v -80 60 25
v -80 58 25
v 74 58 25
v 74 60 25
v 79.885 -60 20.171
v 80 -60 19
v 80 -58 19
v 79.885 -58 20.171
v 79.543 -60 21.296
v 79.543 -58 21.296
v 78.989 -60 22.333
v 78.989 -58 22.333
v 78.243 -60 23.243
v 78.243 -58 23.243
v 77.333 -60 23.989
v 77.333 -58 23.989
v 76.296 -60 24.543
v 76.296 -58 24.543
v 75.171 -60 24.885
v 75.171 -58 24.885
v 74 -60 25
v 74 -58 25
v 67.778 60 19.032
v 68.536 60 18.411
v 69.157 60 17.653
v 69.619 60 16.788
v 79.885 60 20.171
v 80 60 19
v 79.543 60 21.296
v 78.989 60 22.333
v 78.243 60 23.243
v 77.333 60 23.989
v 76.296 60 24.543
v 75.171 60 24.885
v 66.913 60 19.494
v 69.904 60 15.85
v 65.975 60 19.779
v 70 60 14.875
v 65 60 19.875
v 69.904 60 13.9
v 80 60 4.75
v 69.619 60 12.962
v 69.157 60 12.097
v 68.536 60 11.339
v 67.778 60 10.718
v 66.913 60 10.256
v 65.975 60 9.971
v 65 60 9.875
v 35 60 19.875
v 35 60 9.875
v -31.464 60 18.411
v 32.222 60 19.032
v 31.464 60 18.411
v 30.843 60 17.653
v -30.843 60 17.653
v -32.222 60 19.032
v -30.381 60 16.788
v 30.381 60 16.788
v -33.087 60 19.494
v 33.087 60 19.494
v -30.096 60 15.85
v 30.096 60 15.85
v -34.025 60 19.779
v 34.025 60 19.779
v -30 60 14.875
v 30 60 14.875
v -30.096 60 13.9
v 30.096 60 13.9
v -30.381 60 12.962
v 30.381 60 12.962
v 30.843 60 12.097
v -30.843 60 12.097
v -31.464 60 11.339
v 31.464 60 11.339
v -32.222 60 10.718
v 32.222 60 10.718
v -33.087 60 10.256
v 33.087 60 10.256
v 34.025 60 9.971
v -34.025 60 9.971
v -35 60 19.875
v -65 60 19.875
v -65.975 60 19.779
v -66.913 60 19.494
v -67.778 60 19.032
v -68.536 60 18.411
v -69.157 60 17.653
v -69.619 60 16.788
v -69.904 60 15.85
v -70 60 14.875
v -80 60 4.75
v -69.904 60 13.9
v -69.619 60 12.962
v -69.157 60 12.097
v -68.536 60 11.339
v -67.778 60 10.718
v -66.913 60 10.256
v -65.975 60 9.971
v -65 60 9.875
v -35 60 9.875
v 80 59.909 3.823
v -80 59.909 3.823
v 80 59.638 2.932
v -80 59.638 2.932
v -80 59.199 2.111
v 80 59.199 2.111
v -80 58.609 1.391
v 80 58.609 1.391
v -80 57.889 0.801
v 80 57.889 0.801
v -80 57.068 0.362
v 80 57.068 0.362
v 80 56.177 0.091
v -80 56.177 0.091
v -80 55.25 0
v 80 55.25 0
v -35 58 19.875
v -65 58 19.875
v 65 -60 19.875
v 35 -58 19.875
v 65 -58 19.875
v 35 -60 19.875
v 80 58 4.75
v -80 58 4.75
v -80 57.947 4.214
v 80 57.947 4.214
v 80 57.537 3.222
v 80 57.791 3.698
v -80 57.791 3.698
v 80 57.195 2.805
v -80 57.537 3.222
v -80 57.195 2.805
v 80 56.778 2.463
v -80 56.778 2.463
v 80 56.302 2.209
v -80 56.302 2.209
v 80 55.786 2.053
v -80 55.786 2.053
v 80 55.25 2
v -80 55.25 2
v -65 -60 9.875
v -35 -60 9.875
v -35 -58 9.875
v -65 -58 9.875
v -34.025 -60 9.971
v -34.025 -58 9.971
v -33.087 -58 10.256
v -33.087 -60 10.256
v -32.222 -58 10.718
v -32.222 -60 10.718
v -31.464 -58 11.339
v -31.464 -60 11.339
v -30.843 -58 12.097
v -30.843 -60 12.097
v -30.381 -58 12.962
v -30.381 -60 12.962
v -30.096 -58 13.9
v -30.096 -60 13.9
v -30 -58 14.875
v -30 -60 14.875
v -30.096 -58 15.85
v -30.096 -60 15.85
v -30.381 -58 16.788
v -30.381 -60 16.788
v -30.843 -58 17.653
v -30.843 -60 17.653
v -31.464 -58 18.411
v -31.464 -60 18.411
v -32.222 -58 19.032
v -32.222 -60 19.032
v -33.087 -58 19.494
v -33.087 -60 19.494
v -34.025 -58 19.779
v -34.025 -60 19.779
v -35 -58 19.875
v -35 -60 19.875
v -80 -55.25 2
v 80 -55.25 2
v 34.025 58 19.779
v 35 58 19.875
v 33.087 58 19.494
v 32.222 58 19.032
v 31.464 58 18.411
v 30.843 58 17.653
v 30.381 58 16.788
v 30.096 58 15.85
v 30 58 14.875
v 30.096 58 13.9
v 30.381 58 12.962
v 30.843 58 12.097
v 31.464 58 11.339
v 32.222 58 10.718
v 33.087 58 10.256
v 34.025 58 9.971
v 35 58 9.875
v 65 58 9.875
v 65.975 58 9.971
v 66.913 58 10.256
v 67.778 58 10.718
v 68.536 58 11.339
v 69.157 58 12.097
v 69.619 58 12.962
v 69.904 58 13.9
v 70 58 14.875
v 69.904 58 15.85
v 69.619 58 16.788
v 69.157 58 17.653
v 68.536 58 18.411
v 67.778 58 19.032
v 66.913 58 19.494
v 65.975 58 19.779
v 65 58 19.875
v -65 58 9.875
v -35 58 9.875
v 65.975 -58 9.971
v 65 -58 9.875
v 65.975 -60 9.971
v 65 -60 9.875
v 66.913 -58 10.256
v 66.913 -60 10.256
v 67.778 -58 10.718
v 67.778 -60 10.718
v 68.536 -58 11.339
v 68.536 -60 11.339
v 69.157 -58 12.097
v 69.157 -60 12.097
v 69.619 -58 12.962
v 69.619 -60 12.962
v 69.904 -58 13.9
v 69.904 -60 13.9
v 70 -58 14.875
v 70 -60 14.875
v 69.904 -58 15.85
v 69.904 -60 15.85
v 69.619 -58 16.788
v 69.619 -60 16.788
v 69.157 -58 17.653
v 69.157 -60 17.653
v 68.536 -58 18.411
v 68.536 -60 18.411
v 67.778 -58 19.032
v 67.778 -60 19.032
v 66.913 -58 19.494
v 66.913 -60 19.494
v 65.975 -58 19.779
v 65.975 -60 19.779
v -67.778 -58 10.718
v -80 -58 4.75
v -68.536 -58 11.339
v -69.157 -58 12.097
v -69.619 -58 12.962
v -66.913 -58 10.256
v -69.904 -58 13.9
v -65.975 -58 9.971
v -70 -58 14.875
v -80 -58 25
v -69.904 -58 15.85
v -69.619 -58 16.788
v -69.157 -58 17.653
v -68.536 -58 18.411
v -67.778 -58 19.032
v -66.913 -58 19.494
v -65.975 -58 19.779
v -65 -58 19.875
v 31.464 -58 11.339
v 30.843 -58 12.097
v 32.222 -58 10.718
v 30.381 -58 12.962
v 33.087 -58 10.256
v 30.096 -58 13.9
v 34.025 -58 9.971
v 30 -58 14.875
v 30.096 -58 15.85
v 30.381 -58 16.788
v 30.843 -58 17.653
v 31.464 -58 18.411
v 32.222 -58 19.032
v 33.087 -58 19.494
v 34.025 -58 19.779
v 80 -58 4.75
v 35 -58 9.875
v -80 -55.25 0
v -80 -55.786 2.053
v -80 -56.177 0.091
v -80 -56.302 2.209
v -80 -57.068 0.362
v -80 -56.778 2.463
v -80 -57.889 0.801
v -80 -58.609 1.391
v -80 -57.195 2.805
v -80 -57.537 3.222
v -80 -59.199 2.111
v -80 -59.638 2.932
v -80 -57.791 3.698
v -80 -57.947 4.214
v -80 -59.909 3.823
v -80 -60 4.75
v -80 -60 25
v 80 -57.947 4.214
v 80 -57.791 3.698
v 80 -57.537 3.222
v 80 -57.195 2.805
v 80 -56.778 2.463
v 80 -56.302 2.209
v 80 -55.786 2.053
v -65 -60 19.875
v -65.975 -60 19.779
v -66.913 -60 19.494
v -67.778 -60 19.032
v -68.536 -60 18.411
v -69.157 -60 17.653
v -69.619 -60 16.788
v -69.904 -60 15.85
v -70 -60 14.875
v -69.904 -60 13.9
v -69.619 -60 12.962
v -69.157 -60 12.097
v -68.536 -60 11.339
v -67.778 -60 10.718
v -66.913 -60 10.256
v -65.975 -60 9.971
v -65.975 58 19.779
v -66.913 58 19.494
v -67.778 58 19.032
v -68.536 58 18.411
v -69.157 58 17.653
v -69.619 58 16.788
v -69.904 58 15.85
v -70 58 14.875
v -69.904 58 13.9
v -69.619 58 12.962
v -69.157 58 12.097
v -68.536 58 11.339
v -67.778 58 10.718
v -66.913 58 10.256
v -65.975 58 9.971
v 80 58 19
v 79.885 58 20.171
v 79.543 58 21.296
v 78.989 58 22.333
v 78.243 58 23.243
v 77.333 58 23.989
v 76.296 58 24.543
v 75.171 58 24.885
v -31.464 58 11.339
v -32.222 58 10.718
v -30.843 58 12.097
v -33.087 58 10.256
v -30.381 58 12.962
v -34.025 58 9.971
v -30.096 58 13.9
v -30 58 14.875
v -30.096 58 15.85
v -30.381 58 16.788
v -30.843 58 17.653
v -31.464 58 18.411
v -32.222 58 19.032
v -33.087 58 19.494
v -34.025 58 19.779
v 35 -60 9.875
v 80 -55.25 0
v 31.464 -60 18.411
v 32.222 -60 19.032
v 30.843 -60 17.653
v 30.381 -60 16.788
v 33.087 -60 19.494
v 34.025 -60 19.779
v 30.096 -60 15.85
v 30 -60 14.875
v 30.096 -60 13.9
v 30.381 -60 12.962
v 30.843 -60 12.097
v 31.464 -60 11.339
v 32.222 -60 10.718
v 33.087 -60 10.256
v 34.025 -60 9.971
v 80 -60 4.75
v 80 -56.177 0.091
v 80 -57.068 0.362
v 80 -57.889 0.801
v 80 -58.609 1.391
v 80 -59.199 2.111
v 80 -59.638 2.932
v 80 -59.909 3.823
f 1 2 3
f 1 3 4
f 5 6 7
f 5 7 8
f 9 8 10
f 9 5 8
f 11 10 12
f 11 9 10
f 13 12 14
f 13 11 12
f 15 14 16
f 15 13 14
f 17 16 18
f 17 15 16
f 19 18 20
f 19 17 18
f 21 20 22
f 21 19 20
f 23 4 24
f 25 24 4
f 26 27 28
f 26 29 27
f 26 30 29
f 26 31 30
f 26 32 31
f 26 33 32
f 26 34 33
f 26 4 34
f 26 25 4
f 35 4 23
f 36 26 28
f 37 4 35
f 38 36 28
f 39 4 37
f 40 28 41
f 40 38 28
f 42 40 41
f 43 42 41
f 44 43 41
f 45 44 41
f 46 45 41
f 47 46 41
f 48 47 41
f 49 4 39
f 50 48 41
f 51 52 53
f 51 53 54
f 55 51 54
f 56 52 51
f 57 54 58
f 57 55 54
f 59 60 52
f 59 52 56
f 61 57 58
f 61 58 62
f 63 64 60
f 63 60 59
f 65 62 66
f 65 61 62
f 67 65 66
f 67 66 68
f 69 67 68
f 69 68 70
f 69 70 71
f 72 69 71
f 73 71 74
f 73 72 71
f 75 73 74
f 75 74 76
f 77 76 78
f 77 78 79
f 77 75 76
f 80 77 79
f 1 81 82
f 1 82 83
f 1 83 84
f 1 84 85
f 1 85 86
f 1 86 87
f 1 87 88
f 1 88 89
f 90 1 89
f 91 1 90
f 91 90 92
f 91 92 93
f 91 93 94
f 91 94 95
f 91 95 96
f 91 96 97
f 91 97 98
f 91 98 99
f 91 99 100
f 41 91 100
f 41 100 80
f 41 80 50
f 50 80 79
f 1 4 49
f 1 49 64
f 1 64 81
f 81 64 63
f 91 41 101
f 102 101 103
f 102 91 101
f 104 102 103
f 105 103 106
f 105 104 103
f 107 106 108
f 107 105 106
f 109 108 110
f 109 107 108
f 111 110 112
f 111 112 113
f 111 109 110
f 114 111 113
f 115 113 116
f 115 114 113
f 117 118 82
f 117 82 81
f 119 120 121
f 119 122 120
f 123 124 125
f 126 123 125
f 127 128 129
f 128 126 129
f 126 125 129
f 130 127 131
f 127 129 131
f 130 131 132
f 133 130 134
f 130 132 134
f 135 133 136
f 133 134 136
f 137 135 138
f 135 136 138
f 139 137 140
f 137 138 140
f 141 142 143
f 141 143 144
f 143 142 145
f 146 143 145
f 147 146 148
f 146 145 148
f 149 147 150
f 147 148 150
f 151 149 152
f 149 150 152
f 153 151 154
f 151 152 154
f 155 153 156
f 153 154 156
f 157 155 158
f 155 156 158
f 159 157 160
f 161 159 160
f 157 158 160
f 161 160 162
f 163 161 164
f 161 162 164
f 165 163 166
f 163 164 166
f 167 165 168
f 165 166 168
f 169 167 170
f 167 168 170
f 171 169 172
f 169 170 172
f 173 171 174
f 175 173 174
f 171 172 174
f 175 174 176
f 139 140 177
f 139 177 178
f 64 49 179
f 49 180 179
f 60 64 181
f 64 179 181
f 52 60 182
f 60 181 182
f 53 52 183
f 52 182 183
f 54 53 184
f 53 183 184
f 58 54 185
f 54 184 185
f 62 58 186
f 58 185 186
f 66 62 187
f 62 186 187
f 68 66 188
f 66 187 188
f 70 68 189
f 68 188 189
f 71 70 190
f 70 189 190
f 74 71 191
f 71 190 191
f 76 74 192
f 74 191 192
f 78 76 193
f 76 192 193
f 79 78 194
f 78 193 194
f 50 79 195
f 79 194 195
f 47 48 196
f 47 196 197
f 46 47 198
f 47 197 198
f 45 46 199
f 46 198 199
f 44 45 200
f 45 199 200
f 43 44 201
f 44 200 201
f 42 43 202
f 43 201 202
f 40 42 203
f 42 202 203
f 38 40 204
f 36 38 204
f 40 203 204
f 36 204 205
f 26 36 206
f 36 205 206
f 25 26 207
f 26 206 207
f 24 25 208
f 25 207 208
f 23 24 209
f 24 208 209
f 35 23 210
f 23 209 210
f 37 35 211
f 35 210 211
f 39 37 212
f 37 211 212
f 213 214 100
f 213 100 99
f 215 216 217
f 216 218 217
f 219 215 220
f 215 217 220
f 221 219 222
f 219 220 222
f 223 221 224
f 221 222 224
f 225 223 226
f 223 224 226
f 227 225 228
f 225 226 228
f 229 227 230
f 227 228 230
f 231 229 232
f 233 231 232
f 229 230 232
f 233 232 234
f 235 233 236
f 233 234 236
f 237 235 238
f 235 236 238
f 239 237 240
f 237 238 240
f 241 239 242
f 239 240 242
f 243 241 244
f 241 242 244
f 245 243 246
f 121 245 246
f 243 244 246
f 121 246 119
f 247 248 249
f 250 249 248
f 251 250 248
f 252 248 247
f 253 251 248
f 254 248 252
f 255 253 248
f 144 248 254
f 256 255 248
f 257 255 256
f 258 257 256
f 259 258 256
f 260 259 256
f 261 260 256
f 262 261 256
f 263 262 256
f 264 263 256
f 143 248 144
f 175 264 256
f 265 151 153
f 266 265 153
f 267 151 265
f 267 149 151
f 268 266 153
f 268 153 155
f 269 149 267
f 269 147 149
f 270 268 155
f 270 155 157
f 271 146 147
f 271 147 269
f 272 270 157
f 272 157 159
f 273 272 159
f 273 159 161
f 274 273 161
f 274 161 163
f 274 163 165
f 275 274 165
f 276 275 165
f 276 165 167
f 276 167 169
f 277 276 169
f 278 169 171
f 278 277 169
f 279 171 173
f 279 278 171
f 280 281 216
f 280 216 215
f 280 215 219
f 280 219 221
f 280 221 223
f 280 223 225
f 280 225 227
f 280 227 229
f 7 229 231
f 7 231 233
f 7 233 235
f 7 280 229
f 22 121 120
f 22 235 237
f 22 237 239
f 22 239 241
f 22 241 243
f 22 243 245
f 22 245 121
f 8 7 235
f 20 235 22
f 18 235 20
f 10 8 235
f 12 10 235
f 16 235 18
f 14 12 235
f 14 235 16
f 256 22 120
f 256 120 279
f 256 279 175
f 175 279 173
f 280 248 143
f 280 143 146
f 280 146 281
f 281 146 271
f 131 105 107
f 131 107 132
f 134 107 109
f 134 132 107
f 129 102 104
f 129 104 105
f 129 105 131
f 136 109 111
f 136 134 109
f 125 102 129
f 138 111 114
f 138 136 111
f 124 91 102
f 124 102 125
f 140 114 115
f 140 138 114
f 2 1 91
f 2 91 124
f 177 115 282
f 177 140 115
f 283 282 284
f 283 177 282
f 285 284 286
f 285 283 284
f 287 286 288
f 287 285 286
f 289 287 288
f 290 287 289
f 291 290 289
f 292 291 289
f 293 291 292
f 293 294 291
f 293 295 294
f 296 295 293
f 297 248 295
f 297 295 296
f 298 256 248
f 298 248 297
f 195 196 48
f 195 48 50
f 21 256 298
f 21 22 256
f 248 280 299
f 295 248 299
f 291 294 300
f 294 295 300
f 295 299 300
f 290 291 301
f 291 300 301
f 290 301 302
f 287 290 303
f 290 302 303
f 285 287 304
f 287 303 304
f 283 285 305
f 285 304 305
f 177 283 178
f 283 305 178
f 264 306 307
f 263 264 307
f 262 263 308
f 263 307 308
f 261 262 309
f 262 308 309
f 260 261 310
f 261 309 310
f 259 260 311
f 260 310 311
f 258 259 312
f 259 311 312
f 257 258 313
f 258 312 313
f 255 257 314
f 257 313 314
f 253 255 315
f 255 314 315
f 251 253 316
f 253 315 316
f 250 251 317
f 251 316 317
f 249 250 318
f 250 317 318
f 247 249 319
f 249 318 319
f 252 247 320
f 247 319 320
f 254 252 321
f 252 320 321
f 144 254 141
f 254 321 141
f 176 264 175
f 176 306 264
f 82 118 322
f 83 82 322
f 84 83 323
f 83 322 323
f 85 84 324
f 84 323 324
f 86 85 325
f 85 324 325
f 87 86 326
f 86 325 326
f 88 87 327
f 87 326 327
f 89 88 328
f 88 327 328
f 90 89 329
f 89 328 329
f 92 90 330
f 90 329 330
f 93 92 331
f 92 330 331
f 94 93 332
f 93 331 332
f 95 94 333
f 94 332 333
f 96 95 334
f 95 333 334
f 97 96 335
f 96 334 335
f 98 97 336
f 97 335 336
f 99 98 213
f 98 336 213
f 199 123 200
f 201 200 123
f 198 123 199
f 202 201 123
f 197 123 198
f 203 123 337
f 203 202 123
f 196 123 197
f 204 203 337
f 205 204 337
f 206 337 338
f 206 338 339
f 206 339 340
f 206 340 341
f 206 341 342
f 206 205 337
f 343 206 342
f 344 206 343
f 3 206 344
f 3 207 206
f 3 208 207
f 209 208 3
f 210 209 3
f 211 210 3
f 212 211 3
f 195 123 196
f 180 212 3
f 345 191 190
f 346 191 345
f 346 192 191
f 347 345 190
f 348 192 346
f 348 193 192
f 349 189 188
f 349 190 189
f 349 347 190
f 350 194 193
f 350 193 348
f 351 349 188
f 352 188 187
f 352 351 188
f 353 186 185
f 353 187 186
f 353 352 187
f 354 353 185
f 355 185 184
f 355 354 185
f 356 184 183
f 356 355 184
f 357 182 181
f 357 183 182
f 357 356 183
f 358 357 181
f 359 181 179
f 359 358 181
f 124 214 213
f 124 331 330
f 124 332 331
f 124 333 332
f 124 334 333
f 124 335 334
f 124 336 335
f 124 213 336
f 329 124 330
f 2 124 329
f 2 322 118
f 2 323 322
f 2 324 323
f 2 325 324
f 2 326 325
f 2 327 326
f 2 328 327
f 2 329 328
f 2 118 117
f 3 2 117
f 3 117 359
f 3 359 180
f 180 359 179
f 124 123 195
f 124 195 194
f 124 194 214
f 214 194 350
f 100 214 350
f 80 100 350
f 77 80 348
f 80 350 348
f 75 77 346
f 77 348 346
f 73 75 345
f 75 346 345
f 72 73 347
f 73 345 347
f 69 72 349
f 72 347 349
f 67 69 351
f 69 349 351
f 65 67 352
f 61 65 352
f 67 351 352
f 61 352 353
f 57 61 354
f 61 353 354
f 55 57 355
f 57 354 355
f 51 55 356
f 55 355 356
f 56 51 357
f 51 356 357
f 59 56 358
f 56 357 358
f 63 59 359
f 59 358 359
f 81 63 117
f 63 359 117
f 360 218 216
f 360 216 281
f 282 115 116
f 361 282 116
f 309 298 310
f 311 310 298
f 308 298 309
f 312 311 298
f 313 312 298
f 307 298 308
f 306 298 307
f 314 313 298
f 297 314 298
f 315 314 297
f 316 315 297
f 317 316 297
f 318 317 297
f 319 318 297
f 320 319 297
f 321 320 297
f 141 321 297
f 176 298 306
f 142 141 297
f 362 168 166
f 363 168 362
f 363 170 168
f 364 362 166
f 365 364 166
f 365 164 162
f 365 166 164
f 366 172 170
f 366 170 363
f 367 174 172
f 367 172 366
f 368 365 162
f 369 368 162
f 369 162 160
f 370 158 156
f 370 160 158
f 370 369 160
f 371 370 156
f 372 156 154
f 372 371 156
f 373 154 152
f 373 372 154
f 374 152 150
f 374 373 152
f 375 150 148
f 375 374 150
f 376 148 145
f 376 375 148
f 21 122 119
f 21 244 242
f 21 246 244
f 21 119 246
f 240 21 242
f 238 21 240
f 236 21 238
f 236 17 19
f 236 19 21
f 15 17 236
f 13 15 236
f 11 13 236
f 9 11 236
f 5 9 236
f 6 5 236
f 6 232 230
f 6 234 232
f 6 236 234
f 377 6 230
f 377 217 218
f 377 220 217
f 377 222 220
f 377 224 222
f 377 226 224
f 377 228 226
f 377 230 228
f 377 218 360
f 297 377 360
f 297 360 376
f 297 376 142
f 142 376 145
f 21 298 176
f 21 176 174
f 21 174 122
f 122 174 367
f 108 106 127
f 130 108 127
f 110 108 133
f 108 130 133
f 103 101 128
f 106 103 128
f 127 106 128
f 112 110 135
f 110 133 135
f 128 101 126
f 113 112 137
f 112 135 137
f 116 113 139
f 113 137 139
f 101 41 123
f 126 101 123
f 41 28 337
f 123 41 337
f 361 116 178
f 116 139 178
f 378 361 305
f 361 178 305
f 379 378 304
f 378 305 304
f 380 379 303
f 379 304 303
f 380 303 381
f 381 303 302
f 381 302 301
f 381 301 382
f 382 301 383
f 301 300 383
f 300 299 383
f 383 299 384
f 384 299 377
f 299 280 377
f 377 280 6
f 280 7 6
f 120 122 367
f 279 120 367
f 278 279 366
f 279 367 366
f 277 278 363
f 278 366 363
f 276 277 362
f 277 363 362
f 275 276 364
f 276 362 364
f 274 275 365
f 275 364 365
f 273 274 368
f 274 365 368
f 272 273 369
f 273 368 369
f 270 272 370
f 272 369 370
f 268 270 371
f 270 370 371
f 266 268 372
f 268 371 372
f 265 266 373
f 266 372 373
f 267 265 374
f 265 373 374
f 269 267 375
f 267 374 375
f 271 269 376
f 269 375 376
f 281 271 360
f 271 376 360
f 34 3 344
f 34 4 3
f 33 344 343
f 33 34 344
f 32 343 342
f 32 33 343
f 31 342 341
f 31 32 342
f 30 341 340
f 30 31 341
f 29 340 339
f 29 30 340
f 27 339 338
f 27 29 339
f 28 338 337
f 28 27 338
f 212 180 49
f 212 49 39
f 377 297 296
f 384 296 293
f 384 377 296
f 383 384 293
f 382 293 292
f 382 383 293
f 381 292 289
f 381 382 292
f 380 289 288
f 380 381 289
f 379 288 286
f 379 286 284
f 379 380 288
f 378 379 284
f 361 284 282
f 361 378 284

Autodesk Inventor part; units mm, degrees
ref_plane "YZ Plane" through (0, 0, 0) normal (1, 0, 0) x (0, 1, 0)
ref_plane "XZ Plane" through (0, 0, 0) normal (0, 1, 0) x (-1, 0, 0)
ref_plane "XY Plane" through (0, 0, 0) normal (0, 0, 1) x (1, 0, 0)
sketch "Sketch1" plane through (0, 0, 0) normal (0, 0, 1) x (1, 0, 0)
  line L0 (-80, -60) -> (80, -60)
  line L1 (80, -60) -> (80, 60)
  line L2 (80, 60) -> (-80, 60)
  line L3 (-80, 60) -> (-80, -60)
  line L4 (-80, -60) -> (80, 60) construction
  line L5 (80, -60) -> (-80, 60) construction
  point P0 (0, 0)
  dimension "d0" = 160
  dimension "d1" = 120
extrude "Plate1" add sketch "Sketch1" along normal blind 2
sketch "Sketch2" plane through (0, 0, 0) normal (0, 0, -1) x (-1, 0, 0)
  line L0 (-60, 40) -> (140, 40) construction
  line L1 (140, 40) -> (140, 20) construction
  line L2 (140, 20) -> (-60, 20) construction
  line L3 (-60, 20) -> (-60, 40) construction
  line L4 (-80, 60) -> (80, 60) projected
  line L5 (-80, -60) -> (-80, 60) projected
  point P0 (0, 0)
  point P1 (-48, 100)
  point P2 (-50, 98)
  dimension "d6" = 200
  dimension "d9" = 20
  dimension "d10" = 20
  dimension "d11" = 20
mark "Mark1"
sketch "Sketch3" plane through (80, 58, 0) normal (0, 1, 0) x (-1, 0, 0)
  line L0 (160, 0) -> (0, 0)
  line L1 (0, 0) -> (0, -25)
  line L2 (0, -25) -> (160, -25)
  line L3 (160, -25) -> (160, 0)
edge flange "Flange1" height 25 angle 90 thickness 2 bend radius 2.75 thickness toward (0, 1, 0) relief round relief width 2 relief depth 1 corner gap 2.75 corner form 0 edges at (0, 60, 0) (0, -60, 0) wall of the first edge with corners at (-80, 58, 0) (80, 58, 0) (80, 58, 25) (-80, 58, 25)
bend "Bend1"
corner "Corner1"
sketch "Sketch4" plane through (0, 0, 0) normal (0, 1, 0) x (-1, 0, 0)
  line L0 (-80, 4.75) -> (80, 4.75) construction
  line L1 (80, 4.75) -> (80, 25) projected
  line L2 (80, 25) -> (-80, 25) construction
  line L3 (-80, 4.75) -> (-80, 25) projected
  line L4 (-65, 14.875) -> (-35, 14.875) construction
  line L5 (-65, 9.875) -> (-35, 9.875)
  line L6 (-35, 19.875) -> (-65, 19.875)
  arc A0 (-65, 19.875) -> (-65, 9.875) centre (-65, 14.875) ccw
  arc A1 (-35, 9.875) -> (-35, 19.875) centre (-35, 14.875) ccw
  line L7 (35, 14.875) -> (65, 14.875) construction
  line L8 (35, 9.875) -> (65, 9.875)
  line L9 (65, 19.875) -> (35, 19.875)
  arc A2 (35, 19.875) -> (35, 9.875) centre (35, 14.875) ccw
  arc A3 (65, 9.875) -> (65, 19.875) centre (65, 14.875) ccw
  line L10 (0, 4.75) -> (0, 25) construction
  point P0 (0, 0)
  point P1 (-50, 14.875)
  point P2 (50, 14.875)
  point P3 (-80, 14.875)
  dimension "d22" = 30
  dimension "d23" = 10
  dimension "d24" = 100
extrude "Extrusion1" cut sketch "Sketch4" along normal through all both and the other way through all
fillet "Corner Round1" radius 6 2 edges at (80, 59, 25) (80, -59, 25)
equation "\"d2\" = Thickness"
equation "\"d12\" = BendReliefWidth"
equation "\"d13\" = BendReliefDepth"
equation "\"d14\" = MinimumRemnant"
equation "\"d15\" = TransitionRadius"
equation "\"d18\" = BendRadius"
equation "\"d19\" = CornerReliefSize"
equation "\"d20\" = GapSize"
equation "\"d21\" = JacobiRadiusSize"
equation "\"BendReliefWidth\" = Thickness"
equation "\"BendReliefDepth\" = 0.5 * Thickness"
equation "\"CornerReliefSize\" = 4 * Thickness"
equation "\"MinimumRemnant\" = 2 * Thickness"
equation "\"TransitionRadius\" = BendRadius"
equation "\"JacobiRadiusSize\" = BendRadius"
equation "\"GapSize\" = Thickness"
equation "\"Thickness\" = 2"
equation "\"BendRadius\" = 2.75"
properties part number "TRM 026 right board damper" material "AISI 304"
